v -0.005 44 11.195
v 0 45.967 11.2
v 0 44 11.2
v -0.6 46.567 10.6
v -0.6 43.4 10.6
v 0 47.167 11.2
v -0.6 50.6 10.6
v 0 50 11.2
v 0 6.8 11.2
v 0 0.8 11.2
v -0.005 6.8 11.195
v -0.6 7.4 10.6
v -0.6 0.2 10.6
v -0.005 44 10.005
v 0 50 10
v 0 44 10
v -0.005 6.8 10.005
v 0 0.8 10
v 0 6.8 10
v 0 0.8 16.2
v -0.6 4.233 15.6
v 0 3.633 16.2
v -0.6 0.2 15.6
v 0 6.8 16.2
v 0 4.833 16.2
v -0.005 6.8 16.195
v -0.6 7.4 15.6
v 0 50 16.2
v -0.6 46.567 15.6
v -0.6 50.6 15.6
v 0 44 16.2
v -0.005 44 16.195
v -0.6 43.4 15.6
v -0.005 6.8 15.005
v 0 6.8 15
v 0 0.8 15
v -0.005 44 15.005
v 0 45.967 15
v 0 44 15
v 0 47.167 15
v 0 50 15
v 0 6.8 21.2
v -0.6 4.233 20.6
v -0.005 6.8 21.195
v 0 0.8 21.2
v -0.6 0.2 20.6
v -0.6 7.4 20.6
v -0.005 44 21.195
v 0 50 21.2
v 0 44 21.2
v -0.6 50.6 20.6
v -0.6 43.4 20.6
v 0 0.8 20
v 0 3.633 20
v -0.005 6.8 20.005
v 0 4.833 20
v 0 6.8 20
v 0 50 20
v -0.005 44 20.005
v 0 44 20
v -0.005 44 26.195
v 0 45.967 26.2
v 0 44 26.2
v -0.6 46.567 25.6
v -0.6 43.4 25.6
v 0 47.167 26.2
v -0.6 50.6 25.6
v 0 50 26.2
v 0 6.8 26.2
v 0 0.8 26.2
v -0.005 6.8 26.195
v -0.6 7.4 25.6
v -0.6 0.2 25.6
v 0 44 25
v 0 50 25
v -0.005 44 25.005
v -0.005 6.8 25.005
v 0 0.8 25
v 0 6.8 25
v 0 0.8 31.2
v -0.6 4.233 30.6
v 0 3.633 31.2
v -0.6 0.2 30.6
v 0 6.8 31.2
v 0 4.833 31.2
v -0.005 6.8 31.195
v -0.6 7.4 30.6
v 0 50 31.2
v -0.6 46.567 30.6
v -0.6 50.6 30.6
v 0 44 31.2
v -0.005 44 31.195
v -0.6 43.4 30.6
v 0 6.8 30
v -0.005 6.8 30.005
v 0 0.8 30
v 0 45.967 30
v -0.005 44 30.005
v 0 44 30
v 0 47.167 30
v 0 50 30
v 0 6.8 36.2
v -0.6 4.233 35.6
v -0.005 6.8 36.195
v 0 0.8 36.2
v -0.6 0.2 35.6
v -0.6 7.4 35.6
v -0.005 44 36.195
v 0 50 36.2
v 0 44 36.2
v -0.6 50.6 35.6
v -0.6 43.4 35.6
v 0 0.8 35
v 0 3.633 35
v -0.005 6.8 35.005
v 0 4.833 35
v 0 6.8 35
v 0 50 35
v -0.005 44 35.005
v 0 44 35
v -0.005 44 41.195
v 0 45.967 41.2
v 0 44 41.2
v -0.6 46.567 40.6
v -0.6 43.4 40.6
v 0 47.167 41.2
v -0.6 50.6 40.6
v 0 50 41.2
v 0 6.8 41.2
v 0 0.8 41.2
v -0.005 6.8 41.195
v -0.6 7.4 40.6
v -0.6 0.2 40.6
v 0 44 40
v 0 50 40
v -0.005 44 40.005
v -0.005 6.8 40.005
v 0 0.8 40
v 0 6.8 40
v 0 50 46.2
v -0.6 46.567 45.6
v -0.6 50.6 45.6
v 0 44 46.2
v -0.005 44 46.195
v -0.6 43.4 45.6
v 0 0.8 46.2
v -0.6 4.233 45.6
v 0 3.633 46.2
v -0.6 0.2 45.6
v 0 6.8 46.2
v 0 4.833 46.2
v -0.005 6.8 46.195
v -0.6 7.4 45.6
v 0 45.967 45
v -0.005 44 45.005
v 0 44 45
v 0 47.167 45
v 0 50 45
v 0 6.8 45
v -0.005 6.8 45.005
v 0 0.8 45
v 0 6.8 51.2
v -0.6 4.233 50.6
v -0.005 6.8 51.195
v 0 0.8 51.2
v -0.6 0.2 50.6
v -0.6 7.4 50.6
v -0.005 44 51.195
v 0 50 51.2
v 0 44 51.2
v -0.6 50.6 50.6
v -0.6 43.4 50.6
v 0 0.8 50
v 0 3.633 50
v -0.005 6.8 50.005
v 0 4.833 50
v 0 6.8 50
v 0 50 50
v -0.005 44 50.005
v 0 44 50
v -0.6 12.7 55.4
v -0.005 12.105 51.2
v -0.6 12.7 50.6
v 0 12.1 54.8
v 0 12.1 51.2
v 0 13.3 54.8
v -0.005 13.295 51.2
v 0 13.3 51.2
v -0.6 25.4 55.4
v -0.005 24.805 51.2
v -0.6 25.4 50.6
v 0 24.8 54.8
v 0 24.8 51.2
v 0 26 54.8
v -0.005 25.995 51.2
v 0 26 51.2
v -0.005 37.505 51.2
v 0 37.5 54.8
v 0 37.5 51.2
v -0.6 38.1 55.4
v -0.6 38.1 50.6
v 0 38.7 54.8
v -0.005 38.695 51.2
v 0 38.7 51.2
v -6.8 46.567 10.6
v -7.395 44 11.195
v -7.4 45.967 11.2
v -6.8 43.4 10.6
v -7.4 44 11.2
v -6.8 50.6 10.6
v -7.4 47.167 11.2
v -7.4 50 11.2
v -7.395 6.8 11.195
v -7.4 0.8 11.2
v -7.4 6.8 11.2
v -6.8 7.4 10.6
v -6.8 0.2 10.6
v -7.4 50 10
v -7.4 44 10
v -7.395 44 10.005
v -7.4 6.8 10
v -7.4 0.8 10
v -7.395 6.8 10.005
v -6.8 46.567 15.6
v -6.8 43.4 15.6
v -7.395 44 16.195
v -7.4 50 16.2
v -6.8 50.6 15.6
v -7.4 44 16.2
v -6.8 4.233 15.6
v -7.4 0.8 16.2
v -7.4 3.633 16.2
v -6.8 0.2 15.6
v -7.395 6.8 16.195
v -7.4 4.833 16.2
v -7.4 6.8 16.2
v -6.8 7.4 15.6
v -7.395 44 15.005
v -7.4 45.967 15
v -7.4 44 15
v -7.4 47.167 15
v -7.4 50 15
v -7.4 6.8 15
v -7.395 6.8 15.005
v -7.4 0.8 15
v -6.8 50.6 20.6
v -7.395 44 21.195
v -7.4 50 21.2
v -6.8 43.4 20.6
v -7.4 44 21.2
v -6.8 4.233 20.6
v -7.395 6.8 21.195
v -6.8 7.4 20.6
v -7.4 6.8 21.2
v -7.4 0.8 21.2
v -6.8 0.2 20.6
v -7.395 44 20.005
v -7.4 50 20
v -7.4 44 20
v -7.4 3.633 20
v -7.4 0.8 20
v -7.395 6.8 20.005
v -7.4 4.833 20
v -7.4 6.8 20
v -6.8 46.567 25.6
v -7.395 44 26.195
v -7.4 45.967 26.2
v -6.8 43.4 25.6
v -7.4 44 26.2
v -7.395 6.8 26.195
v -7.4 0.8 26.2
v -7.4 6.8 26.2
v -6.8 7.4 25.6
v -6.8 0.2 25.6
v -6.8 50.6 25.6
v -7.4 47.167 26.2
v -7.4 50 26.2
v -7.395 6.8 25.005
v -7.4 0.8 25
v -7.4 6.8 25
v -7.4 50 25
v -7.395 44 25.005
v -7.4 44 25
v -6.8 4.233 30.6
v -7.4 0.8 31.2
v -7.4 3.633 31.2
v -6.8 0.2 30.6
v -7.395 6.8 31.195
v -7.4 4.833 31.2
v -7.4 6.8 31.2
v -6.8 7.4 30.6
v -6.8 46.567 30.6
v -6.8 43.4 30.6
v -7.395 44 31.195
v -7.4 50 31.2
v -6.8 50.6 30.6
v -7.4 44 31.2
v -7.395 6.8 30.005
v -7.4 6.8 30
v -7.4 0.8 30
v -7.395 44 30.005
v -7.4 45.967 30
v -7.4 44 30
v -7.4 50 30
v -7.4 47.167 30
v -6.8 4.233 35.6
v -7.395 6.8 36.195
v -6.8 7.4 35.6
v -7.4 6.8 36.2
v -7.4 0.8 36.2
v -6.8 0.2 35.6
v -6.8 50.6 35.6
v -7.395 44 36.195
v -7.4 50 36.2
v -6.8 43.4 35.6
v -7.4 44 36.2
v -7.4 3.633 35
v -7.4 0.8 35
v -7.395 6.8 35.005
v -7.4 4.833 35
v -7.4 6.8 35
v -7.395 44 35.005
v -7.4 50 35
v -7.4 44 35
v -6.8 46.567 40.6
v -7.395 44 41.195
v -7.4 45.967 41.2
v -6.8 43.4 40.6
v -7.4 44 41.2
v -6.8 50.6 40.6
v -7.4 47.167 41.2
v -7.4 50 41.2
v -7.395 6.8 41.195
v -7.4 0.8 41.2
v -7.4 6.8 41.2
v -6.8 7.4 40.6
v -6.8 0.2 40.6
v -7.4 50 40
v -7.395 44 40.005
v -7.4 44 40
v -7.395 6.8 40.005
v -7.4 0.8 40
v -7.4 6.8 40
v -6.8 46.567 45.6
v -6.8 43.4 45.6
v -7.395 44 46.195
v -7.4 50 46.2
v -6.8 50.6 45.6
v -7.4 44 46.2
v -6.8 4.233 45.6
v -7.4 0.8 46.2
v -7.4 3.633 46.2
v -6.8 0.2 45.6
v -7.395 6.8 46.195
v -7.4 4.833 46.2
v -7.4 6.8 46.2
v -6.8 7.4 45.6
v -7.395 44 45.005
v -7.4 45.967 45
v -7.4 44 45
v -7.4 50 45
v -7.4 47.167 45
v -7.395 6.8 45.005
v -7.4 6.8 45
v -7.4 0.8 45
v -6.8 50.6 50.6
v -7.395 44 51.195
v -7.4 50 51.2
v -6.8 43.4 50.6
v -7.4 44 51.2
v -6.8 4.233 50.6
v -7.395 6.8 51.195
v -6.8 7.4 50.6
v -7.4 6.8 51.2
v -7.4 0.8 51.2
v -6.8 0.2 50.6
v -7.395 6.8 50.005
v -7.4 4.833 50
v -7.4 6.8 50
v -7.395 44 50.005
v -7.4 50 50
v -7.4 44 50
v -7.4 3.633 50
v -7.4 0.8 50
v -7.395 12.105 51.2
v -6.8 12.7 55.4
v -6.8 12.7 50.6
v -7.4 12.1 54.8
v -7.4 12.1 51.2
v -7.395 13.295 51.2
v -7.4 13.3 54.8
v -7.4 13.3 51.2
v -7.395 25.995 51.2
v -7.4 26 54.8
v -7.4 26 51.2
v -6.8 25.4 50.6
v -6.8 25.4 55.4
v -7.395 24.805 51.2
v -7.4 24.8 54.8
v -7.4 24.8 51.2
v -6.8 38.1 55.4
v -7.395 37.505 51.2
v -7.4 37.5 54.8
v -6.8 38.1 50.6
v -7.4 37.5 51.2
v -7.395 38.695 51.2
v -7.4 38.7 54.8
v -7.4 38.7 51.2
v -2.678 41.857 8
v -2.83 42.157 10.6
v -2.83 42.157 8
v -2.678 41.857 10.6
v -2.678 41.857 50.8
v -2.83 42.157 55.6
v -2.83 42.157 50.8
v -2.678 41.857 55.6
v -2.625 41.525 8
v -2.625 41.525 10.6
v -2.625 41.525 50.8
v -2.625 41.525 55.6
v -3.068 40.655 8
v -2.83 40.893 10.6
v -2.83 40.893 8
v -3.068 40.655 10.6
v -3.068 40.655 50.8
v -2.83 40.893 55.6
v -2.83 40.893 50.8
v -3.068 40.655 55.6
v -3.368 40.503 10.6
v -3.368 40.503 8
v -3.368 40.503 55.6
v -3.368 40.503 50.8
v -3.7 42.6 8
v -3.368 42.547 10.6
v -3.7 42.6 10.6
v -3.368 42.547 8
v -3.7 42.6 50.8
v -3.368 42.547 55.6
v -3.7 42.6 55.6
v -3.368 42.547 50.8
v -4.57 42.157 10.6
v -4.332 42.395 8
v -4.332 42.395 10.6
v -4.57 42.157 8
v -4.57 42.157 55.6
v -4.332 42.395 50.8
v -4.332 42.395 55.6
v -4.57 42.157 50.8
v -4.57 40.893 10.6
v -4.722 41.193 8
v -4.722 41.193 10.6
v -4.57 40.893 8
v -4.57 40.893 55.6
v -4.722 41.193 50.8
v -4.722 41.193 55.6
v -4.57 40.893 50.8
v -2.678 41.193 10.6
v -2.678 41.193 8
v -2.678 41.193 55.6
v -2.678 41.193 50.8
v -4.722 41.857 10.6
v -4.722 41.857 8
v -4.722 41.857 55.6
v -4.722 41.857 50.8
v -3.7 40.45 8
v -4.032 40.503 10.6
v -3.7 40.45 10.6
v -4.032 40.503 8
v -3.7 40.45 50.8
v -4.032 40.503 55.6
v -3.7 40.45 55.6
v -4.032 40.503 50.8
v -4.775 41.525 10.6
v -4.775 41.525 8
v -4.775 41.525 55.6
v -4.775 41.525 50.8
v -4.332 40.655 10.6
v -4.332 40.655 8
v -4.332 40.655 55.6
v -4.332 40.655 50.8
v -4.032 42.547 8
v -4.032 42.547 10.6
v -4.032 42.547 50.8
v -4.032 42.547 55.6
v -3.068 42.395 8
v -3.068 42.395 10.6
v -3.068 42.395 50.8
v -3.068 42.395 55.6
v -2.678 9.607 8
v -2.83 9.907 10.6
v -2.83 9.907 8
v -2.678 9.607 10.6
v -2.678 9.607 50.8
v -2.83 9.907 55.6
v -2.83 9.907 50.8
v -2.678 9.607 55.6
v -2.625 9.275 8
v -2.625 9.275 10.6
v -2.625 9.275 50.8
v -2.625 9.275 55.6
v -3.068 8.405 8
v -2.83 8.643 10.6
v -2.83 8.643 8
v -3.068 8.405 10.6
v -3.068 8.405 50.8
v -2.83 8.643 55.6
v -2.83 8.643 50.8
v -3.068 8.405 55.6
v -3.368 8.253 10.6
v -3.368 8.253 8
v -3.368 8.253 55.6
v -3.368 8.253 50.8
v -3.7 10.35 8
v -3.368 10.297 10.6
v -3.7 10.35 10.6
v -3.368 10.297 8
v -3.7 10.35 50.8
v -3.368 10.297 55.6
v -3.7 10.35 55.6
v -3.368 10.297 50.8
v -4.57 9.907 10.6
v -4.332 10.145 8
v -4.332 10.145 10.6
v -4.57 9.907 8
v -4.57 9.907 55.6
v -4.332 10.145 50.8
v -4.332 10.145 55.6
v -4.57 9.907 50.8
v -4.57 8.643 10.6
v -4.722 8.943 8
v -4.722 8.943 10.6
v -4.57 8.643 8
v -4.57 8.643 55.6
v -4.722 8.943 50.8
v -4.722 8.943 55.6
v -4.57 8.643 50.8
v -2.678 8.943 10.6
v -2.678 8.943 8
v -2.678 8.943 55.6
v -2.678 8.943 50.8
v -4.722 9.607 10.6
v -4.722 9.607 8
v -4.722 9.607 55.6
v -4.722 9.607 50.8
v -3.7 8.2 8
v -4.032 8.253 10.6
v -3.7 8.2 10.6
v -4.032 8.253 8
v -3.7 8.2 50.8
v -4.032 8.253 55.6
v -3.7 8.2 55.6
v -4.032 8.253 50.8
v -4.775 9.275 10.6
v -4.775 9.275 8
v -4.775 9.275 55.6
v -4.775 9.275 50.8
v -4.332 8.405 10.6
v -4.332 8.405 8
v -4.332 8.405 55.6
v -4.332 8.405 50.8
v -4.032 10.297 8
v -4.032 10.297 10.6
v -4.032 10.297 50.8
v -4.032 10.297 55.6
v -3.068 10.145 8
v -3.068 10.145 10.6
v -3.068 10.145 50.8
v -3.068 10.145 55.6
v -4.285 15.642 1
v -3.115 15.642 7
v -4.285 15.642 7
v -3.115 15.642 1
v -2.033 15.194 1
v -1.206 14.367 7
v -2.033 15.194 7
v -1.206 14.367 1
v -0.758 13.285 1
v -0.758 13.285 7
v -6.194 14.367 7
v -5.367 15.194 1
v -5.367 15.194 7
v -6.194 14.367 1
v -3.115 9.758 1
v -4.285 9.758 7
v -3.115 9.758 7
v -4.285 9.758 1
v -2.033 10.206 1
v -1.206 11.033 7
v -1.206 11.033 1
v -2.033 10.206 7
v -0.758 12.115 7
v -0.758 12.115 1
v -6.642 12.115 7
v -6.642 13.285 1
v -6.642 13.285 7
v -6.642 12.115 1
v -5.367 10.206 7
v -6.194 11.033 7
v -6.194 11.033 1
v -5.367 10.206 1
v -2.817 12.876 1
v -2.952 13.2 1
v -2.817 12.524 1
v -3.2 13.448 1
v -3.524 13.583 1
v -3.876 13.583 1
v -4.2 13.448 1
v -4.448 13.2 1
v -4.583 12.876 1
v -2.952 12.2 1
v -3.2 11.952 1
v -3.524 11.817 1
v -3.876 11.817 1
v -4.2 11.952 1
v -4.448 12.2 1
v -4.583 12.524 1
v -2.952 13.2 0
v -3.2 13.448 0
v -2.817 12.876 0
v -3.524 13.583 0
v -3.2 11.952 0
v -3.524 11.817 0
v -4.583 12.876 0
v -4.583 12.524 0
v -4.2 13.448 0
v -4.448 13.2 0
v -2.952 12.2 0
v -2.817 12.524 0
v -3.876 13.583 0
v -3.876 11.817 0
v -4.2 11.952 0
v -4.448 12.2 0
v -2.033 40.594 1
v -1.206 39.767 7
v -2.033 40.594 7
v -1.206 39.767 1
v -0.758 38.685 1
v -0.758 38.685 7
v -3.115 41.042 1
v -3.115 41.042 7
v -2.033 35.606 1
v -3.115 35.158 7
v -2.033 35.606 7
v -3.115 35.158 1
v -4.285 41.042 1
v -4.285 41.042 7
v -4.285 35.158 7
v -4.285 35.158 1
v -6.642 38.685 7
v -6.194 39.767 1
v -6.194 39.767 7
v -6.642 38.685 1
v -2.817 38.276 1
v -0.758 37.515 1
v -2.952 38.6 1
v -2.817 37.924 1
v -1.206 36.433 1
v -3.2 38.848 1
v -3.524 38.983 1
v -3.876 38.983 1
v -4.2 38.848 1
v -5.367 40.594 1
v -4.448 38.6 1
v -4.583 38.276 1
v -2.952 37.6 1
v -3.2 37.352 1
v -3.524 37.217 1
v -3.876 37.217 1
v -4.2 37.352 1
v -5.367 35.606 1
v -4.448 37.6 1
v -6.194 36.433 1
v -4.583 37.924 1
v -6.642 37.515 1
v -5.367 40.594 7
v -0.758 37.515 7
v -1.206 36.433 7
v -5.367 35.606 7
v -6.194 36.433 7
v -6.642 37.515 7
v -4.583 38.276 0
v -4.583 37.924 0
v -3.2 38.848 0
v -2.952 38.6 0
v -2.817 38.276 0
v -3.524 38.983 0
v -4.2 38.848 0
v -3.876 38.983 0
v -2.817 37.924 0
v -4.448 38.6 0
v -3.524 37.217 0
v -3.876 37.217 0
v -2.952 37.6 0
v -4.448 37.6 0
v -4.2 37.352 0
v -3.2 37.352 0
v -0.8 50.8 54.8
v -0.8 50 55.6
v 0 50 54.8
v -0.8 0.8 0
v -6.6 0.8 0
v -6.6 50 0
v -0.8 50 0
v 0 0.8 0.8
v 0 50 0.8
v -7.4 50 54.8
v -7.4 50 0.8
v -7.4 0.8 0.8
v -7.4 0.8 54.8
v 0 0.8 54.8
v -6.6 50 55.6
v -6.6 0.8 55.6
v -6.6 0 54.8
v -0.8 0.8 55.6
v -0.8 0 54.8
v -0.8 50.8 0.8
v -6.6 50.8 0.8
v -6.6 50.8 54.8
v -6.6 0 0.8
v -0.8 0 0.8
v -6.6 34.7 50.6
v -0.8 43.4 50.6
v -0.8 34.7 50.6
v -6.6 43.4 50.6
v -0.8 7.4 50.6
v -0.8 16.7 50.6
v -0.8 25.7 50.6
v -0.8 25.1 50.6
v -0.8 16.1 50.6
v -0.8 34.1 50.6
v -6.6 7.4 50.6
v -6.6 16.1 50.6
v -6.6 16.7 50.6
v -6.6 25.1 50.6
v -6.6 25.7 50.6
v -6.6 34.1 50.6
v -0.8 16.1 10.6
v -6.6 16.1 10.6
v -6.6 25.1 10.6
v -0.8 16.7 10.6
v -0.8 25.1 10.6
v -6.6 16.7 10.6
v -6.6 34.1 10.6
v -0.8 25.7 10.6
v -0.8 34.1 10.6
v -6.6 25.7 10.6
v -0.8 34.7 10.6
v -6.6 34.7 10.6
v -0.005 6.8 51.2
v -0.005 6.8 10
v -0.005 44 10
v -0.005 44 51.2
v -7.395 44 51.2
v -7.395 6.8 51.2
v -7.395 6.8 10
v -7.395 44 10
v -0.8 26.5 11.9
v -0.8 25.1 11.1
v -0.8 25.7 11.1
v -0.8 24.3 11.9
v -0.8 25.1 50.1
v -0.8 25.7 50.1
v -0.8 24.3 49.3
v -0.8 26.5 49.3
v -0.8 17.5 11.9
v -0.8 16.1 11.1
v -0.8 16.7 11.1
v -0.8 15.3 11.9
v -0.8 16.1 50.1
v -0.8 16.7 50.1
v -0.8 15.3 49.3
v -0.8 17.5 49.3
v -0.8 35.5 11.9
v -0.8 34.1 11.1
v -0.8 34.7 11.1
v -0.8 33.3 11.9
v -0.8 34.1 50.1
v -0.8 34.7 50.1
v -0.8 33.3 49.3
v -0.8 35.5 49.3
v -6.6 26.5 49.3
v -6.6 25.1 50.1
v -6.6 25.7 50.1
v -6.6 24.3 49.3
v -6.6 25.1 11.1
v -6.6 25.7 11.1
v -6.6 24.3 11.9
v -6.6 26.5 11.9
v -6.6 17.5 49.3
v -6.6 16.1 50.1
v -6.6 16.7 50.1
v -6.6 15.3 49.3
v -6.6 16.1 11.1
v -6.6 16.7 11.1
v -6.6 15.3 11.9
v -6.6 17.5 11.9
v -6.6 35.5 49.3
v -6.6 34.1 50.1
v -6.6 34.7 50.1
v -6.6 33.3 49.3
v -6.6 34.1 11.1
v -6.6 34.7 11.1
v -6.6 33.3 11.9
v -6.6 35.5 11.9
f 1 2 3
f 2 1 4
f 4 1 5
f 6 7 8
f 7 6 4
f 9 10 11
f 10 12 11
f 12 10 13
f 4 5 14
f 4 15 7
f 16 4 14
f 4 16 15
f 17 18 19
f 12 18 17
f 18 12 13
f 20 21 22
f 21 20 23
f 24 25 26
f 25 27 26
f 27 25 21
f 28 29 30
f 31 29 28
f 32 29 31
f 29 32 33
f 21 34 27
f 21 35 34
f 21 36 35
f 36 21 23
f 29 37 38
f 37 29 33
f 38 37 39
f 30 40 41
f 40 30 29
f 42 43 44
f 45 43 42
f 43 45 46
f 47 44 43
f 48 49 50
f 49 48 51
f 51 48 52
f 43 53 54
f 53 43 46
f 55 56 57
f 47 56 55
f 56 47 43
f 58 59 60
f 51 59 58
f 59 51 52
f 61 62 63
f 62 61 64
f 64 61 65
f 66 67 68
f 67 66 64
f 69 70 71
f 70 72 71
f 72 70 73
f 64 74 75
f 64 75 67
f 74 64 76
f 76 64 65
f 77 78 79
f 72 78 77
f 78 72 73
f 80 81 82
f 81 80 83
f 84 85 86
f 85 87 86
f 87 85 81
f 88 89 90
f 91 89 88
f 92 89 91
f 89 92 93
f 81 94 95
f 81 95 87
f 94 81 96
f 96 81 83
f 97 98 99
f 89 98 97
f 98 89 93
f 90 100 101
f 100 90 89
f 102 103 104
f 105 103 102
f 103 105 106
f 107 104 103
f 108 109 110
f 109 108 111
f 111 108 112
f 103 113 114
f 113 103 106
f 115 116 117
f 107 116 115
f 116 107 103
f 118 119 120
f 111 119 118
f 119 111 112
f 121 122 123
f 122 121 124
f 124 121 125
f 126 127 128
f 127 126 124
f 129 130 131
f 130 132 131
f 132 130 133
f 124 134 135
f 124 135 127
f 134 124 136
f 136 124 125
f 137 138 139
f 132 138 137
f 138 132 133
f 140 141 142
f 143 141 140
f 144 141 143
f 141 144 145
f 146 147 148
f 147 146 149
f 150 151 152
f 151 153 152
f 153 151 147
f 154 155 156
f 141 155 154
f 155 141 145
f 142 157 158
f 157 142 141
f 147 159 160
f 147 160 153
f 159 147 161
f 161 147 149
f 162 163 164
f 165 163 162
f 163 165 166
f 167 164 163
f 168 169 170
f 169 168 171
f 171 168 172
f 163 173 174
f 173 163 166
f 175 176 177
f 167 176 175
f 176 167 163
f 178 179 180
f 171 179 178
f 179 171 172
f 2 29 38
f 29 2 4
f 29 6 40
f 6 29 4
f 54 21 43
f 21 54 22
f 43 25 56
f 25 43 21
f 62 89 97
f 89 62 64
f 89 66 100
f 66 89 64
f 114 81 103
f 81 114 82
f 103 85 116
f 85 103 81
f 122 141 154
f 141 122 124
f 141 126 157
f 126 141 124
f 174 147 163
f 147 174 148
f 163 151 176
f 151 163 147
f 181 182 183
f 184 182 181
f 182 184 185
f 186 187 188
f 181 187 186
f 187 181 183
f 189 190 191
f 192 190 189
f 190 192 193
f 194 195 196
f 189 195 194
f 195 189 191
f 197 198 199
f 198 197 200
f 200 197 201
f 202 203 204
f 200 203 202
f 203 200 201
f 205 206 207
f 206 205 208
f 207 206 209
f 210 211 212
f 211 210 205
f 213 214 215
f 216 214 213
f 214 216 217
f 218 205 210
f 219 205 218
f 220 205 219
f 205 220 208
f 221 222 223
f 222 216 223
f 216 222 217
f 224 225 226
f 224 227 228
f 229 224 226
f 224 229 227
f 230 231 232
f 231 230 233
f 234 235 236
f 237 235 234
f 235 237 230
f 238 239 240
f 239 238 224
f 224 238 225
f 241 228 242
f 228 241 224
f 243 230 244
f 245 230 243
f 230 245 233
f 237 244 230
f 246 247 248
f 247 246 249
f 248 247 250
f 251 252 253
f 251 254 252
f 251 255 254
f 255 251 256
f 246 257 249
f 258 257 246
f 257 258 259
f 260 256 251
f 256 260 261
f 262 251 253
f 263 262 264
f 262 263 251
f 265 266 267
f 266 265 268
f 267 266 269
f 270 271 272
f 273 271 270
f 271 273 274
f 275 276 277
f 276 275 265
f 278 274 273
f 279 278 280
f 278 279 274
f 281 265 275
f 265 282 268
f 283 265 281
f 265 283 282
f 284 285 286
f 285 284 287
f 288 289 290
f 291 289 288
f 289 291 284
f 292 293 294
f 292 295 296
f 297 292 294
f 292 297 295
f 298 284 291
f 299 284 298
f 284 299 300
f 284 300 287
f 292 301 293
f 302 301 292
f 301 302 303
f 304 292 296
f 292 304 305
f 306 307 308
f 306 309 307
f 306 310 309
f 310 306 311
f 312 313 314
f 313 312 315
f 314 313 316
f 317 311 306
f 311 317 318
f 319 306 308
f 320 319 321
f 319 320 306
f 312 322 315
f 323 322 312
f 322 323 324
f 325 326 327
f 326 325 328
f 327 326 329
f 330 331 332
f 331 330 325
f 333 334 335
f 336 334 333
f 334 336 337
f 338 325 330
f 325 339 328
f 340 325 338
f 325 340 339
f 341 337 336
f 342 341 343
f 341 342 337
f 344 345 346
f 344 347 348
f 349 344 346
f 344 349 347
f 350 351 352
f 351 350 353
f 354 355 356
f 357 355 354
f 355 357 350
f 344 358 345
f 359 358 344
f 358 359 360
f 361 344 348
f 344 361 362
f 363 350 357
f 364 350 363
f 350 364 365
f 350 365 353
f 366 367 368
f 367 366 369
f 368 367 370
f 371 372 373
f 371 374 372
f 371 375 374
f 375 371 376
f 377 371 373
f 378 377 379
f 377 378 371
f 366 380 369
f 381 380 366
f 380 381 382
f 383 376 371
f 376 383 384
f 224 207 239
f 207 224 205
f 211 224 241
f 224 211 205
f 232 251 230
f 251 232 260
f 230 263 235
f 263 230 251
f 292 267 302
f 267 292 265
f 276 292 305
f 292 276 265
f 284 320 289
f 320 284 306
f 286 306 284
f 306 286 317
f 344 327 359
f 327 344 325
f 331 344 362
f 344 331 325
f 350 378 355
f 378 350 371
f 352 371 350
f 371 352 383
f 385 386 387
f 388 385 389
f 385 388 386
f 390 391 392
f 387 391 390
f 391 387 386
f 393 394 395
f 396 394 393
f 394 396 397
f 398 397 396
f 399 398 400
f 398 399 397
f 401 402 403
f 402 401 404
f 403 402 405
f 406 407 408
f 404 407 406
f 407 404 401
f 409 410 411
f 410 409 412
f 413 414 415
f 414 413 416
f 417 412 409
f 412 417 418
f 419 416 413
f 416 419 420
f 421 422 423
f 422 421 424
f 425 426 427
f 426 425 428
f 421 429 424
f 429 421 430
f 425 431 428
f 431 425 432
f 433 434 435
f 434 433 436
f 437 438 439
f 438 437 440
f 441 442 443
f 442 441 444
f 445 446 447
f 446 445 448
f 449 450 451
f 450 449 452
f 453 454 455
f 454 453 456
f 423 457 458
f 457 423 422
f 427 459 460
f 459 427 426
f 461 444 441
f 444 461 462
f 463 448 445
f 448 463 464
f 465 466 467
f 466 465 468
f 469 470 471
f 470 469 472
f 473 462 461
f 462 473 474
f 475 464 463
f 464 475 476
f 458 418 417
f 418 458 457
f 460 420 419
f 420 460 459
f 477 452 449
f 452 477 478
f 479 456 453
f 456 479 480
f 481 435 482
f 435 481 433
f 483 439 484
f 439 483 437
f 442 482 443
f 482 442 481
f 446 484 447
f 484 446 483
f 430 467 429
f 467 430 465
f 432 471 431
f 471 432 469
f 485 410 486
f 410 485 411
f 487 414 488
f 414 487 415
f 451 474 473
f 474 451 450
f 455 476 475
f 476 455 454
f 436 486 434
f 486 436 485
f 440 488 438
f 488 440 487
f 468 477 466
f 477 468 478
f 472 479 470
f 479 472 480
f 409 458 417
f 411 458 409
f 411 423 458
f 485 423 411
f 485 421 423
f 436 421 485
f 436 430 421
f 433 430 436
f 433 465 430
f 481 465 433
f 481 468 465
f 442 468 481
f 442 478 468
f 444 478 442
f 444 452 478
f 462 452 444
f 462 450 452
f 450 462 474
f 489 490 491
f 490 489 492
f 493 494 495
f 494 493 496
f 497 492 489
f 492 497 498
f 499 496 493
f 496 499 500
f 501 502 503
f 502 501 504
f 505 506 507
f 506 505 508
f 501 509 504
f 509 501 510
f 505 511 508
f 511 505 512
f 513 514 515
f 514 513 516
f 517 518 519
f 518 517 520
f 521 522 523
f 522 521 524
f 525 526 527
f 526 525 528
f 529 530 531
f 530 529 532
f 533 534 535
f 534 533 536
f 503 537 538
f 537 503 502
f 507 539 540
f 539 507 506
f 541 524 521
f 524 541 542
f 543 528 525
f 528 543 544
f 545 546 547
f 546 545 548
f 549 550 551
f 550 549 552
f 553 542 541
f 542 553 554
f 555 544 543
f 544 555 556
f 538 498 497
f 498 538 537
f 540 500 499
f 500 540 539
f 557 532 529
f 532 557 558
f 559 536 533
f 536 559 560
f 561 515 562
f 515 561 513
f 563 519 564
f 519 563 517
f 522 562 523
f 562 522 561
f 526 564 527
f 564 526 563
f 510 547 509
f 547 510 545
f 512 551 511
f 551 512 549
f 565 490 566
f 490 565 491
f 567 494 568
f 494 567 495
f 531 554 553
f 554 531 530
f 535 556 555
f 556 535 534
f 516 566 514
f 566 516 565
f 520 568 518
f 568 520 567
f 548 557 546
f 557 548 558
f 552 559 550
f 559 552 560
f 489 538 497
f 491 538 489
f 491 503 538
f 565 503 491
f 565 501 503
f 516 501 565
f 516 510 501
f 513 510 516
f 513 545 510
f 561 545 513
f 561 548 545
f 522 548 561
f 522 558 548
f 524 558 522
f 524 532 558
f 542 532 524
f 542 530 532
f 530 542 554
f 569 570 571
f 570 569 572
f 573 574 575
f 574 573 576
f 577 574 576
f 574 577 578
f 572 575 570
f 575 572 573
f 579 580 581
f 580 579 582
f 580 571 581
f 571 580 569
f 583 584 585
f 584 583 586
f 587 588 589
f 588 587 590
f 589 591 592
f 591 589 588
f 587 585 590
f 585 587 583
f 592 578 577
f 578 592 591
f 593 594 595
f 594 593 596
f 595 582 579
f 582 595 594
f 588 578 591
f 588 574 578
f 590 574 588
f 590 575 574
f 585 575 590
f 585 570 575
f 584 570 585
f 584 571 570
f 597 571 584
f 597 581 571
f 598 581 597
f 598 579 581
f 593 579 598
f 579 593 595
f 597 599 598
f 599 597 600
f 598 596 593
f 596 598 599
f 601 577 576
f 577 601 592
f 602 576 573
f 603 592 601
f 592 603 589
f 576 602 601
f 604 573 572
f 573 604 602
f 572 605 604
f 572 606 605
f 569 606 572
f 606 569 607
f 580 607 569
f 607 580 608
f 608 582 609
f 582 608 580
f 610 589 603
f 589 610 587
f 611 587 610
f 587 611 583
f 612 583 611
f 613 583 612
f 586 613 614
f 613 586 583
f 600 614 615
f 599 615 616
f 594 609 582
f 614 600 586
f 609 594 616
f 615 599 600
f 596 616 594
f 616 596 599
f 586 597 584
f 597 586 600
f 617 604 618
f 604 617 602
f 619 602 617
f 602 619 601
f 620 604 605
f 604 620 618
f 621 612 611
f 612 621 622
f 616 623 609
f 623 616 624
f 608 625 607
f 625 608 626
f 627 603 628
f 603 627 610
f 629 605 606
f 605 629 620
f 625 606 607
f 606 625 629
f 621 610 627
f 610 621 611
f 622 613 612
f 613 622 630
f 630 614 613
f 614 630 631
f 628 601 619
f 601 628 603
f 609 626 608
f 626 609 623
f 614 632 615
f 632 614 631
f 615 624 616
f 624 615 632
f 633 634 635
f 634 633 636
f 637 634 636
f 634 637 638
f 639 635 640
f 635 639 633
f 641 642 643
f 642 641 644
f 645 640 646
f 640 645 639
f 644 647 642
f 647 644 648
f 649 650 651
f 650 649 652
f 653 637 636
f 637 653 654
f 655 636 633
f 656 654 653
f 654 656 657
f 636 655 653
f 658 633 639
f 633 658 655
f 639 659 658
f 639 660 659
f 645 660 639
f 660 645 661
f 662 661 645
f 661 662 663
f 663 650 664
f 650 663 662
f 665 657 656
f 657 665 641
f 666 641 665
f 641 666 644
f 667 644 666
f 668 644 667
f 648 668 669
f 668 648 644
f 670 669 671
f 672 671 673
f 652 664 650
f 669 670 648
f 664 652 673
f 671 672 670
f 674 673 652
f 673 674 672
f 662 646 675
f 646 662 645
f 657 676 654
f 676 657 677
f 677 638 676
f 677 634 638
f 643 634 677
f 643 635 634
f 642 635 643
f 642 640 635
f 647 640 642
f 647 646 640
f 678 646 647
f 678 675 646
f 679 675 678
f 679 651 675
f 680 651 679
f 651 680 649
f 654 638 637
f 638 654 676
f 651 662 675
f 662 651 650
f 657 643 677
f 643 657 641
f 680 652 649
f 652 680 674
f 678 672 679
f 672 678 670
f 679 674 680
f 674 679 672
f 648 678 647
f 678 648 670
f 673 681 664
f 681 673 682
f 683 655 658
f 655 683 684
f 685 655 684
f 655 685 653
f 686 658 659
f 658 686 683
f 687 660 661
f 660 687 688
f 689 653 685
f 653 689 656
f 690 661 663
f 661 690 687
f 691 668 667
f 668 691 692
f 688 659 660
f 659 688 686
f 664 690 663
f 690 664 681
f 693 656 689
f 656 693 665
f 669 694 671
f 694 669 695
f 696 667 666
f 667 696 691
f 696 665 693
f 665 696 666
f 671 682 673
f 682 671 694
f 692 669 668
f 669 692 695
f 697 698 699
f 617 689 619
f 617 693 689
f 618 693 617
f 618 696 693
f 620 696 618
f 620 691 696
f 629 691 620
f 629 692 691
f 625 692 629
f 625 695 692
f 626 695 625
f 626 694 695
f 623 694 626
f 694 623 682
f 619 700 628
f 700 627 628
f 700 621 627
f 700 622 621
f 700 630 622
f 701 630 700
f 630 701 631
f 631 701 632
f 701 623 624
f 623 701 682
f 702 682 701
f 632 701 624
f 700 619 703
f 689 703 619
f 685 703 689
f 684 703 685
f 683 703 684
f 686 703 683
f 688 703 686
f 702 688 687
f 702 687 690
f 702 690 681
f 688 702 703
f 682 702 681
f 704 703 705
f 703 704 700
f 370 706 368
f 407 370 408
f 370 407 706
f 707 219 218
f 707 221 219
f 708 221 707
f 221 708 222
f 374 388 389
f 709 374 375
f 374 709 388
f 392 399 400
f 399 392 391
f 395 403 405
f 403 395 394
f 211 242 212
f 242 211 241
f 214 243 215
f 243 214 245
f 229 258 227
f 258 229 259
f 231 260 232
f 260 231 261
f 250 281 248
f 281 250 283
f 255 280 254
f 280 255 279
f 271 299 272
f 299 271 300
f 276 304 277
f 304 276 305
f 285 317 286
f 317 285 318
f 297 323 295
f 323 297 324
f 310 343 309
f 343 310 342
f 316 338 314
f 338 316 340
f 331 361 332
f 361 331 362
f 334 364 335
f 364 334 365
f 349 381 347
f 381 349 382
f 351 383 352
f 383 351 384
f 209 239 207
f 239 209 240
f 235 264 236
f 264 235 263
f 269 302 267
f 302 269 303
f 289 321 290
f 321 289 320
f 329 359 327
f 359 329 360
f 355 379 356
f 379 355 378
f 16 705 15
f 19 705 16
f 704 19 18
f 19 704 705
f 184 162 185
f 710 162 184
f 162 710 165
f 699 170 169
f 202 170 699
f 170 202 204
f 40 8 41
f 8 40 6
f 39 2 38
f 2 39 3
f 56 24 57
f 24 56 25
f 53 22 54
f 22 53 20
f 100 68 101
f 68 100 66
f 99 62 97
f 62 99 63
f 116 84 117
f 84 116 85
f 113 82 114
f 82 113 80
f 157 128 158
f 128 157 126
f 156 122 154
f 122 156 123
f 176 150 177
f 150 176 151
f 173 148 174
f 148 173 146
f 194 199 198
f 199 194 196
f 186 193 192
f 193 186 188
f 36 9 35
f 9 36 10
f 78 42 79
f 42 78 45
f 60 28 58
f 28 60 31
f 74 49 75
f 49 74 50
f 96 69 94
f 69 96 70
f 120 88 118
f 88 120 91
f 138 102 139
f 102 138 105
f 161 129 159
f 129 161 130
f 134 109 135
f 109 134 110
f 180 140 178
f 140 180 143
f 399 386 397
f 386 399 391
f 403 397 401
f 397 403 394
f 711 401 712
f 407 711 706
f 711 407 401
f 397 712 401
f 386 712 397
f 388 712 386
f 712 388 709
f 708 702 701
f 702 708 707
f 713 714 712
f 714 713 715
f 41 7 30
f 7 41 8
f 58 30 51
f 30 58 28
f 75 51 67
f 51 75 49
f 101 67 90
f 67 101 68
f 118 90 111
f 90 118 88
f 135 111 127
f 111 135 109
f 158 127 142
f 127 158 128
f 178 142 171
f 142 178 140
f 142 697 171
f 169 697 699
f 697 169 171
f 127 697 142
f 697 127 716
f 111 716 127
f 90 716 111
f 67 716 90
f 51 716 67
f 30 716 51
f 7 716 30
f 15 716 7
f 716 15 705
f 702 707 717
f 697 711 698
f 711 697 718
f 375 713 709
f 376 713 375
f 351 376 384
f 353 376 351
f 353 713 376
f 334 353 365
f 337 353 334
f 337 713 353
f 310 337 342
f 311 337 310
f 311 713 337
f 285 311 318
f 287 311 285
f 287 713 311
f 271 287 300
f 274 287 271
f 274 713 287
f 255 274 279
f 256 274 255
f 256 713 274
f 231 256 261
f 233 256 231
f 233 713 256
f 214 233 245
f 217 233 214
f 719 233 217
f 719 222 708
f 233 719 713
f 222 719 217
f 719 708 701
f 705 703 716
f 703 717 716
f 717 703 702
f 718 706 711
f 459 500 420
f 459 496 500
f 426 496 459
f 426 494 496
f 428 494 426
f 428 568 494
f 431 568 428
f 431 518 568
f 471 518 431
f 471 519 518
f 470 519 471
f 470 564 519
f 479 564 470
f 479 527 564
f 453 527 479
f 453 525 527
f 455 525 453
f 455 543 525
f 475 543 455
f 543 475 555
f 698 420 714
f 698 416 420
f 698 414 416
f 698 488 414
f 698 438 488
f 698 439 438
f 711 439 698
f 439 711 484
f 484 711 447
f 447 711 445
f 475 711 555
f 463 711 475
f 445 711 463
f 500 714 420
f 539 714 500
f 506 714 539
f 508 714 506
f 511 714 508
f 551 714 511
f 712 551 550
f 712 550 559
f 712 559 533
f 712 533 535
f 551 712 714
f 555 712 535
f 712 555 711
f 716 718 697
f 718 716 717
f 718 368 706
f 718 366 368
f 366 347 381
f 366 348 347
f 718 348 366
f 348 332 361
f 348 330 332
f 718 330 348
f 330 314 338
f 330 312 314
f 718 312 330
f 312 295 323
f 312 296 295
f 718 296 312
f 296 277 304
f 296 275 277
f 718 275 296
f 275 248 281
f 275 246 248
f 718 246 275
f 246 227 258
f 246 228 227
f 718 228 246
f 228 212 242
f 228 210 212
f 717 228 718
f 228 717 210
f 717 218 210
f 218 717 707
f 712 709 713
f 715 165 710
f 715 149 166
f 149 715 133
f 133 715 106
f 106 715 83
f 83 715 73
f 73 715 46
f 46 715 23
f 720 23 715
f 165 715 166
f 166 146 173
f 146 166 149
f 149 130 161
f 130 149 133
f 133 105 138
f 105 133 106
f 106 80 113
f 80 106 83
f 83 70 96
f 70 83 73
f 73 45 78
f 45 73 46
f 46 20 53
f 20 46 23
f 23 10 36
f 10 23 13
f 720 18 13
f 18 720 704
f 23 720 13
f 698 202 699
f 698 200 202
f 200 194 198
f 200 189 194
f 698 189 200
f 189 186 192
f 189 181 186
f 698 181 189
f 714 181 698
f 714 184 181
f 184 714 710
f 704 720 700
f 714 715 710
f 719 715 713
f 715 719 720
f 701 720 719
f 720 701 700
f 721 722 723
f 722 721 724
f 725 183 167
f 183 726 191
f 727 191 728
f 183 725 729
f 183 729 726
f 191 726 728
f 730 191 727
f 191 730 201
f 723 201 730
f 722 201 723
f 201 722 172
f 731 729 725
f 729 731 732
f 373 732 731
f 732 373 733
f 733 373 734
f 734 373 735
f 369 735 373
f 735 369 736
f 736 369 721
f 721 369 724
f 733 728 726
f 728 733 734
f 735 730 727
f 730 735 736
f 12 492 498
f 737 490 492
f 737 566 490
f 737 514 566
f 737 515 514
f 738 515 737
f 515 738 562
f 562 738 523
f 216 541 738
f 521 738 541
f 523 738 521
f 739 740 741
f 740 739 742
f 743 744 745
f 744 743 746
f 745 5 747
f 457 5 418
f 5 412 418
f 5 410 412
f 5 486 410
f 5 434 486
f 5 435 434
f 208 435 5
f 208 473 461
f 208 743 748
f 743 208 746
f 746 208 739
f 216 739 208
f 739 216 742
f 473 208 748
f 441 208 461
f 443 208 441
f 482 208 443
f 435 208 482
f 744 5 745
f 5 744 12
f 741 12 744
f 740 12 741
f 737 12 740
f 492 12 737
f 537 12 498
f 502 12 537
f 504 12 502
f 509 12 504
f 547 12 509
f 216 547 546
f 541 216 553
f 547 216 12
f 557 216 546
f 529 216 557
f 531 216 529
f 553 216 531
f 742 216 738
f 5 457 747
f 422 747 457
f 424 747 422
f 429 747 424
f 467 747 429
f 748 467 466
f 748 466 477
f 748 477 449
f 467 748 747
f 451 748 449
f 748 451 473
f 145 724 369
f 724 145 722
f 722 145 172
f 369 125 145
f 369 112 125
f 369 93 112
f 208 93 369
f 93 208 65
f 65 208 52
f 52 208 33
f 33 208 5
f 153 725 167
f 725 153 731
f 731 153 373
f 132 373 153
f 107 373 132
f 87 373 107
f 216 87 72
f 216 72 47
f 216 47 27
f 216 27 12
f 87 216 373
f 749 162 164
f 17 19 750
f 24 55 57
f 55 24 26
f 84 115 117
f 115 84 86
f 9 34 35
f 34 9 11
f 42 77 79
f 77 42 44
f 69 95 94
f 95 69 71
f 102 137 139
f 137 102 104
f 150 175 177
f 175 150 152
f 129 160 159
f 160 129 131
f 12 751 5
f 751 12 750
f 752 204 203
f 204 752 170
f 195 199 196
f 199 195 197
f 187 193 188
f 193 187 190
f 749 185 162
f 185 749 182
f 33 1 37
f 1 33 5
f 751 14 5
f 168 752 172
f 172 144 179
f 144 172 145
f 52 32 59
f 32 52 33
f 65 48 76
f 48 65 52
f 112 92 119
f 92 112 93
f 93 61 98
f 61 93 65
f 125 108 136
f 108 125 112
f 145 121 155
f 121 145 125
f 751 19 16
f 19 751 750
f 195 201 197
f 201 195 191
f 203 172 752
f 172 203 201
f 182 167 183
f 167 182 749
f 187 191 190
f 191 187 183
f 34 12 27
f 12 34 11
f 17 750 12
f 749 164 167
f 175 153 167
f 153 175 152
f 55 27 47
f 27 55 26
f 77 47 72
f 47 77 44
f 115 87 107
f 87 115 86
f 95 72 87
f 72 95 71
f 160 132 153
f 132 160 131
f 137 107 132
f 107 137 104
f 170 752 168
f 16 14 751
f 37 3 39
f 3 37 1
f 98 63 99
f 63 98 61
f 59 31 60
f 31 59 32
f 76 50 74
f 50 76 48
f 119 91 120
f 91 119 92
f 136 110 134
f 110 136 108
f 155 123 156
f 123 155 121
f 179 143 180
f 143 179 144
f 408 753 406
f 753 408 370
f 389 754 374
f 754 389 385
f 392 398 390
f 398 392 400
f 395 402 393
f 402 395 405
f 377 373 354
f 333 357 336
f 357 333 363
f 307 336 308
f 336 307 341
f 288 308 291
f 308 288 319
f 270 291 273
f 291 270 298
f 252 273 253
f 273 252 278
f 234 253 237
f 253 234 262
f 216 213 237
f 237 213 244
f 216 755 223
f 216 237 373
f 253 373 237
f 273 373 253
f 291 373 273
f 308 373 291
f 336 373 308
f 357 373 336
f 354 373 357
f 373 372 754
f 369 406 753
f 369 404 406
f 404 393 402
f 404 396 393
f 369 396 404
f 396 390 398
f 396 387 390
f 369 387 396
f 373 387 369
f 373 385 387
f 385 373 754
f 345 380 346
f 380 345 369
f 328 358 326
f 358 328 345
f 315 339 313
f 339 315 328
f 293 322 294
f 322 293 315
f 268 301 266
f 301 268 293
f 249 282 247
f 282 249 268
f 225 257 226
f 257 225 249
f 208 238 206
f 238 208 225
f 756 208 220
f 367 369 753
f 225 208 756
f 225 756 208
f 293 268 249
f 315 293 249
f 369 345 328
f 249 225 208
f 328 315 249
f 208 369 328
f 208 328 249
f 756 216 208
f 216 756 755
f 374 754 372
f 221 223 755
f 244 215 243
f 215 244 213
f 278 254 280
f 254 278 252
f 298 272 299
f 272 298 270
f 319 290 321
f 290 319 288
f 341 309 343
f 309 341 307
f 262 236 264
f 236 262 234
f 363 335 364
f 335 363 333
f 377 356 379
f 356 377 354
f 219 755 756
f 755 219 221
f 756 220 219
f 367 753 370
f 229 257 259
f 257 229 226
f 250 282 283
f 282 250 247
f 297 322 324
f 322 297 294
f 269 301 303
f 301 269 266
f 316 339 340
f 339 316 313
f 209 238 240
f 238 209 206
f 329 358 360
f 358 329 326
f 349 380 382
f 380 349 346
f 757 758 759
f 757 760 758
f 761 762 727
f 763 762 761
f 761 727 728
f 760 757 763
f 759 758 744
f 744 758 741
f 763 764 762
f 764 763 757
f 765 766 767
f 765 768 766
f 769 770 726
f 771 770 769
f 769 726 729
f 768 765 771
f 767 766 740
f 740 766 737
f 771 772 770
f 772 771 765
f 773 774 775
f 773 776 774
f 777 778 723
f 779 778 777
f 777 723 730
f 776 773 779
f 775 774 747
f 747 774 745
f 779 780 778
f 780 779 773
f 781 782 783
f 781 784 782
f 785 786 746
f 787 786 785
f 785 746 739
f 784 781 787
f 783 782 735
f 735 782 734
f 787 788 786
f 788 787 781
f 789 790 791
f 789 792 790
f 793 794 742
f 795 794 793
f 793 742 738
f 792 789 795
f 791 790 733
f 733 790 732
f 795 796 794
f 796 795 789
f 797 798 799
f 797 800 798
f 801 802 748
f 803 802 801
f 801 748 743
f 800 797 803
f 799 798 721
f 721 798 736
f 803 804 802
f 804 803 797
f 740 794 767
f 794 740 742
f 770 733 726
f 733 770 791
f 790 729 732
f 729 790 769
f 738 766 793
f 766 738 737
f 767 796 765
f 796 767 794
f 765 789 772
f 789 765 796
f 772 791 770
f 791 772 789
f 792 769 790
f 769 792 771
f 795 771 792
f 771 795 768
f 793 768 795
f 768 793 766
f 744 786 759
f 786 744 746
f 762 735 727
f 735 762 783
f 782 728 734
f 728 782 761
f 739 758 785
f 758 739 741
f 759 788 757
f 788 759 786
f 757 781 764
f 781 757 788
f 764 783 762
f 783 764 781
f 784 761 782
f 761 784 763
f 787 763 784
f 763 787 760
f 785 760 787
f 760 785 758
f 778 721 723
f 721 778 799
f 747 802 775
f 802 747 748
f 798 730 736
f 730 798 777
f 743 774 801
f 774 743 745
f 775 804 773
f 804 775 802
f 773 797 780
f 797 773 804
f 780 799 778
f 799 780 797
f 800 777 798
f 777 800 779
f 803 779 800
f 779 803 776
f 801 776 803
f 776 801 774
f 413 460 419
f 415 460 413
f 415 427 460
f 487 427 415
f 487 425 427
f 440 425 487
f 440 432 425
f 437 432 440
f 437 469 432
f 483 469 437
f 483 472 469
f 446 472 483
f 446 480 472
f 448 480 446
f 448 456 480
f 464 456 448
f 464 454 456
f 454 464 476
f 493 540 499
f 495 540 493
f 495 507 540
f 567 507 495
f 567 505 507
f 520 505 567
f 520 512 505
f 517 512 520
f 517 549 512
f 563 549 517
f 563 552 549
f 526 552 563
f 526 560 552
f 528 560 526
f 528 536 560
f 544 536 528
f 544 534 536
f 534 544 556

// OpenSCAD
// file: floor_01_solid.scad
include <libs.scad>;

//floor
*round(2);
*diagonal(3,4);
square_floor(6,6);

//import("AS_full.stl");


module square_floor(xsize,ysize)
{
  difference()
  {
    floor_plate(xsize,ysize);
    grids(xsize,ysize);
  }
}
module diagonal(xsize,ysize)
{
  intersection()
  {
    difference()
    {
      floor_plate(xsize,ysize);
      grids(xsize,ysize);
    }
    translate([0,0,floor_thick/2])hull()
    {
      //we want a slanted portion, so we'll hull two thin slivers that reach to the length
      cube([2*xsize*basis-bevel*2*sqrt(2),ep,floor_thick],center=true);
      cube([2*xsize*basis,ep,floor_thick-bevel*2],center=true);
      cube([ep,2*ysize*basis-bevel*2*sqrt(2),floor_thick],center=true);
      cube([ep,2*ysize*basis,floor_thick-bevel*2],center=true);
    }
    translate([0,0,floor_thick/2])cube([xsize*2*basis-bevel*2,ysize*2*basis-bevel*2,floor_thick],center=true);
  }
}
module round(radius)
{
  intersection()
  {
    difference()
    {
      floor_plate(radius,radius);
      grids(radius,radius);
    }
    hull()
    {
      translate([0,0,bevel])cylinder(r=radius*basis,h=floor_thick-bevel*2,$fn=200);
      cylinder(r=radius*basis-bevel,h=floor_thick,$fn=200);
    }
  }
}
// file: wall_01_solid.scad
include <libs.scad>;

//wall
*linear_wall(4);
*round_wall(2);
corner_wall(6);
*shim_wall(2);
*import("finalized_stl/square_floor/floor_square_2x2_a.stl");

module shim_wall(size)
{
  translate([-wall_width/2,size*basis/2,floor_thick/2])hull()
  {
    cube([wall_width,basis*size-bevel*2,floor_thick-bevel*2],center=true);
    cube([wall_width-bevel*2,basis*size,floor_thick-bevel*2],center=true);
    cube([wall_width-bevel*2,basis*size-bevel*2,floor_thick],center=true);
  }
}


module linear_wall_base(size, height=wall_height)
{
    translate([-wall_width/2,size*basis/2,height/2])hull()
    {
        cube([wall_width-bevel*2,size*basis,height-bevel*2],center=true);
        cube([wall_width-bevel*2,size*basis-bevel*2,height],center=true);
        cube([wall_width,size*basis-bevel*2,height-bevel*2],center=true);
    }
}

module round_wall_base(size)
{
    difference()
    {
        hull()
        {
            translate([0,0,bevel])cylinder(r=size*basis+wall_width,h=wall_height-bevel*2);
            cylinder(r=size*basis+wall_width-bevel,h=wall_height);
        }
        cylinder(r=size*basis,h=wall_height);
        translate([0,0,-ep])cylinder(r1=size*basis+bevel,r2=size*basis,h=bevel);
        translate([0,0,wall_height-bevel+ep])cylinder(r2=size*basis+bevel,r1=size*basis,h=bevel);
    }
}

module linear_brick_grids(size)
{
    //one for each wall level, horizontal
    brick_h=(wall_height-floor_thick)/wall_layers;
    for (ii=[0:wall_layers-1])
    {
        translate([0,size*basis/2,floor_thick+ii*brick_h])rotate([0,45,0])cube([wall_groove*sqrt(2),size*basis*2,wall_groove*sqrt(2)],center=true);
    }
    //vertical
    //one above floor is off by half, then even, then off
    for (ii=[1:1:wall_layers])
    {
        for(jj=[0:.5:size+1])
        {
            translate([0,jj*basis-(ii%6)*basis/6,floor_thick+ii*brick_h-brick_h/2])rotate([0,0,45])cube([wall_groove*sqrt(2),wall_groove*sqrt(2),brick_h],center=true);
        }
    }
}

module round_brick_grids(size)
{
    brick_h=(wall_height-floor_thick)/wall_layers;
    //horizontal
    for (ii=[0:wall_layers-1])
    {
        translate([0,0,floor_thick+ii*brick_h])hull()
        {
            cylinder(r=basis*size+wall_groove,h=ep,center=true);
            cylinder(r=basis*size,h=wall_groove*2,center=true);
        }
    }
    //vertical
    //vertical should be shifted each layer
    for (ii=[1:1:wall_layers])
    {
        for(jj=[0:30/size:120])
        {
            rotate([0,0,jj+(ii%6)*(10/size)])translate([basis*size,0,floor_thick+ii*brick_h-brick_h/2])rotate([0,0,45])cube([wall_groove*sqrt(2),wall_groove*sqrt(2),brick_h],center=true);
        }
    }
}

module round_wall(size)
{
    xx=basis*size+wall_width;
    yy=basis*size+wall_width;
    zz=wall_height;
    difference()
    {
        intersection()
        {
            round_wall_base(size);
            translate([.5*(basis*size+wall_width),.5*(basis*size+wall_width),wall_height/2])hull()
            {
                cube([xx-bevel*2,yy,zz-bevel*2],center=true);
                cube([xx-bevel*2,yy-bevel*2,zz],center=true);
                cube([xx,yy-bevel*2,zz-bevel*2],center=true);
            }
        }
        hull()
        {
            cube([basis*size*2+bevel*2,ep,zz*3],center=true);
            cube([ep,basis*size*2+bevel*2,zz*3],center=true);
        }
        round_brick_grids(size);
    }
}

module linear_wall(size)
{
    difference()
    {
        linear_wall_base(size);
        linear_brick_grids(size);
        *translate([-wall_width,0,0])linear_brick_grids(size);
    }
}

module corner_wall(size)
{
  intersection()
  {
    linear_wall(size);
    //45 degree slope so we can do inside corners
    translate([0,0,0])hull()
    {
      //beveling
      translate([0,0,-ep])linear_extrude(wall_height+ep*2)offset(delta=-bevel)hull()
      {
        translate([0,basis*0.5*size])square([ep,basis*size-wall_tol*2],center=true);
        translate([-wall_width,basis*0.5*size])square([ep,basis*size-wall_tol*2-wall_width*2],center=true);
      }
      translate([0,0,bevel])linear_extrude(wall_height-bevel*2)hull()
      {
        translate([0,basis*0.5*size])square([ep,basis*size-wall_tol*2],center=true);
        translate([-wall_width,basis*0.5*size])square([ep,basis*size-wall_tol*2-wall_width*2],center=true);
      }
    }
  }
}
// main file
include <libs.scad>;
use <wall_01_solid.scad>;
use <floor_01_solid.scad>;

dual_doorway_wall();

*half_door();
module linear_door_grid(size)
{
  //one for each wall level, horizontal
  brick_h=(doorway_height-floor_thick)/door_layers;
  for (ii=[0:door_layers-1])
  {
    translate([0,size*basis/2,floor_thick+ii*brick_h])rotate([0,45,0])cube([wall_groove*sqrt(2),size*basis*2,wall_groove*sqrt(2)],center=true);
  }
  //vertical
  //one above floor is off by half, then even, then off
  for (ii=[1:1:door_layers])
  {
    for(jj=[0:.5:size+1])
    {
      translate([0,jj*basis-(ii%6)*basis/6,floor_thick+ii*brick_h-brick_h/2])rotate([0,0,45])cube([wall_groove*sqrt(2),wall_groove*sqrt(2),brick_h],center=true);
    }
  }
}
module dual_doorway_wall()
{
  difference()
  {
    echo(wall_height);
    echo(doorway_height);
    linear_wall_base(2,doorway_height);
    //door cutaway
    translate([-wall_width/2,basis*1,door_height/2+floor_thick])cube([wall_width*2,dual_door_width,door_height],center=true);
    linear_door_grid(2);
    translate([-wall_width,0,0])linear_door_grid(2);
    //bevel
    translate([0,basis*1,door_height/2+floor_thick])hull()
    {
      translate([-wall_groove/2,0,0])cube([wall_groove,dual_door_width,door_height],center=true);
      cube([ep,dual_door_width+wall_groove*2,door_height+wall_groove*2],center=true);
    }
    translate([-wall_width,basis*1,door_height/2+floor_thick])hull()
    {
      translate([wall_groove/2,0,0])cube([wall_groove,dual_door_width,door_height],center=true);
      cube([ep,dual_door_width+wall_groove*2,door_height+wall_groove*2],center=true);
    }
    //hinge
    for(aa=[-1:2:1])translate([-wall_width/2,basis*1-aa*(dual_door_width/2-door_pin_r-hinge_t),1+magnet_r*2+1])cylinder(r=door_pin_r,h=doorway_height,$fn=20);
      //magnet
    linear_mag_holes(2);
  }
  //supports
  support_space=dual_door_width/4;
  for(aa=[-1:1:1])
  {
    translate([-wall_width/2,basis+support_space*aa,door_height/2+floor_thick])cube([wall_width-bevel*2,line_w*2-layer_t,door_height],center=true);
    translate([-wall_width/2,basis+support_space*aa,door_height/2+floor_thick])hull()
    {
      cube([wall_width-bevel*2,line_w*2-layer_t,door_height-1],center=true);
      cube([wall_width-bevel*2,line_w*2-layer_t+bevel*2,door_height-1-bevel*2],center=true);
    }
  }
  //hole single layer bridging
  translate([-wall_width/2,basis,layer_t/2+floor_thick+door_height])cube([wall_width-bevel*2,dual_door_width,layer_t],center=true);
}
module door_panel()
{
  panel_w=dual_door_width/2-door_w_tol-hinge_t-door_pin_r;
  difference()
  {
    union()
    {
      translate([0,panel_w/2,0])hull()
      {
        cube([door_pin_r*2+hinge_t*2-bevel*2,panel_w,door_height-door_h_tol],center=true);
        cube([door_pin_r*2+hinge_t*2,panel_w,door_height-door_h_tol-bevel*2],center=true);
        //cube([door_pin_r*2+hinge_t*2,panel_w,door_height-door_h_tol],center=true);
      }
      cylinder(r=door_pin_r+hinge_t,h=door_height-door_h_tol,center=true,$fn=20);
    }
    cylinder(r=door_pin_r,h=door_height,center=true,$fn=20);
  }
}
module half_door()
{
  difference()
  {
    door_panel();
    door_decor();
  }
}
module door_decor()
{
  wood_windows();
  intersection()
  {
    translate([door_deco_inset/2,0,0])wood_windows();
    wood_grain();
  }
  intersection()
  {
    translate([-door_deco_inset/2,0,0])wood_windows();
    wood_grain();
  }
}
//door_decor();
module wood_windows()
{
  //6 panels
  bar_w=1;
  panel_t=door_pin_r*2+hinge_t*2;
  
  panel_w=dual_door_width/2-door_w_tol-hinge_t-door_pin_r;
  inset_w=(panel_w-bar_w*3)/2;
  inset_h=(door_height-door_h_tol-bar_w*4)/3;
  for(aa=[-.5:1:.5])
  {
    for(bb=[-1:1:1])
    {
      for(cc=[-1:2:1])
      {
        translate([cc*panel_t/2,panel_w/2+aa*(inset_w+bar_w),bb*(inset_h+bar_w)])cube([door_deco_inset*2,inset_w,inset_h],center=true);
      }
    }
  }
}
module wood_grain()
{
  translate([0,dual_door_width/4,0])scale([1,.5,.5*doorway_height/wall_height])rotate([0,0,90])rotate([90,0,0])translate([0,0,-5])linear_extrude(10)import("wood.dxf");
}
